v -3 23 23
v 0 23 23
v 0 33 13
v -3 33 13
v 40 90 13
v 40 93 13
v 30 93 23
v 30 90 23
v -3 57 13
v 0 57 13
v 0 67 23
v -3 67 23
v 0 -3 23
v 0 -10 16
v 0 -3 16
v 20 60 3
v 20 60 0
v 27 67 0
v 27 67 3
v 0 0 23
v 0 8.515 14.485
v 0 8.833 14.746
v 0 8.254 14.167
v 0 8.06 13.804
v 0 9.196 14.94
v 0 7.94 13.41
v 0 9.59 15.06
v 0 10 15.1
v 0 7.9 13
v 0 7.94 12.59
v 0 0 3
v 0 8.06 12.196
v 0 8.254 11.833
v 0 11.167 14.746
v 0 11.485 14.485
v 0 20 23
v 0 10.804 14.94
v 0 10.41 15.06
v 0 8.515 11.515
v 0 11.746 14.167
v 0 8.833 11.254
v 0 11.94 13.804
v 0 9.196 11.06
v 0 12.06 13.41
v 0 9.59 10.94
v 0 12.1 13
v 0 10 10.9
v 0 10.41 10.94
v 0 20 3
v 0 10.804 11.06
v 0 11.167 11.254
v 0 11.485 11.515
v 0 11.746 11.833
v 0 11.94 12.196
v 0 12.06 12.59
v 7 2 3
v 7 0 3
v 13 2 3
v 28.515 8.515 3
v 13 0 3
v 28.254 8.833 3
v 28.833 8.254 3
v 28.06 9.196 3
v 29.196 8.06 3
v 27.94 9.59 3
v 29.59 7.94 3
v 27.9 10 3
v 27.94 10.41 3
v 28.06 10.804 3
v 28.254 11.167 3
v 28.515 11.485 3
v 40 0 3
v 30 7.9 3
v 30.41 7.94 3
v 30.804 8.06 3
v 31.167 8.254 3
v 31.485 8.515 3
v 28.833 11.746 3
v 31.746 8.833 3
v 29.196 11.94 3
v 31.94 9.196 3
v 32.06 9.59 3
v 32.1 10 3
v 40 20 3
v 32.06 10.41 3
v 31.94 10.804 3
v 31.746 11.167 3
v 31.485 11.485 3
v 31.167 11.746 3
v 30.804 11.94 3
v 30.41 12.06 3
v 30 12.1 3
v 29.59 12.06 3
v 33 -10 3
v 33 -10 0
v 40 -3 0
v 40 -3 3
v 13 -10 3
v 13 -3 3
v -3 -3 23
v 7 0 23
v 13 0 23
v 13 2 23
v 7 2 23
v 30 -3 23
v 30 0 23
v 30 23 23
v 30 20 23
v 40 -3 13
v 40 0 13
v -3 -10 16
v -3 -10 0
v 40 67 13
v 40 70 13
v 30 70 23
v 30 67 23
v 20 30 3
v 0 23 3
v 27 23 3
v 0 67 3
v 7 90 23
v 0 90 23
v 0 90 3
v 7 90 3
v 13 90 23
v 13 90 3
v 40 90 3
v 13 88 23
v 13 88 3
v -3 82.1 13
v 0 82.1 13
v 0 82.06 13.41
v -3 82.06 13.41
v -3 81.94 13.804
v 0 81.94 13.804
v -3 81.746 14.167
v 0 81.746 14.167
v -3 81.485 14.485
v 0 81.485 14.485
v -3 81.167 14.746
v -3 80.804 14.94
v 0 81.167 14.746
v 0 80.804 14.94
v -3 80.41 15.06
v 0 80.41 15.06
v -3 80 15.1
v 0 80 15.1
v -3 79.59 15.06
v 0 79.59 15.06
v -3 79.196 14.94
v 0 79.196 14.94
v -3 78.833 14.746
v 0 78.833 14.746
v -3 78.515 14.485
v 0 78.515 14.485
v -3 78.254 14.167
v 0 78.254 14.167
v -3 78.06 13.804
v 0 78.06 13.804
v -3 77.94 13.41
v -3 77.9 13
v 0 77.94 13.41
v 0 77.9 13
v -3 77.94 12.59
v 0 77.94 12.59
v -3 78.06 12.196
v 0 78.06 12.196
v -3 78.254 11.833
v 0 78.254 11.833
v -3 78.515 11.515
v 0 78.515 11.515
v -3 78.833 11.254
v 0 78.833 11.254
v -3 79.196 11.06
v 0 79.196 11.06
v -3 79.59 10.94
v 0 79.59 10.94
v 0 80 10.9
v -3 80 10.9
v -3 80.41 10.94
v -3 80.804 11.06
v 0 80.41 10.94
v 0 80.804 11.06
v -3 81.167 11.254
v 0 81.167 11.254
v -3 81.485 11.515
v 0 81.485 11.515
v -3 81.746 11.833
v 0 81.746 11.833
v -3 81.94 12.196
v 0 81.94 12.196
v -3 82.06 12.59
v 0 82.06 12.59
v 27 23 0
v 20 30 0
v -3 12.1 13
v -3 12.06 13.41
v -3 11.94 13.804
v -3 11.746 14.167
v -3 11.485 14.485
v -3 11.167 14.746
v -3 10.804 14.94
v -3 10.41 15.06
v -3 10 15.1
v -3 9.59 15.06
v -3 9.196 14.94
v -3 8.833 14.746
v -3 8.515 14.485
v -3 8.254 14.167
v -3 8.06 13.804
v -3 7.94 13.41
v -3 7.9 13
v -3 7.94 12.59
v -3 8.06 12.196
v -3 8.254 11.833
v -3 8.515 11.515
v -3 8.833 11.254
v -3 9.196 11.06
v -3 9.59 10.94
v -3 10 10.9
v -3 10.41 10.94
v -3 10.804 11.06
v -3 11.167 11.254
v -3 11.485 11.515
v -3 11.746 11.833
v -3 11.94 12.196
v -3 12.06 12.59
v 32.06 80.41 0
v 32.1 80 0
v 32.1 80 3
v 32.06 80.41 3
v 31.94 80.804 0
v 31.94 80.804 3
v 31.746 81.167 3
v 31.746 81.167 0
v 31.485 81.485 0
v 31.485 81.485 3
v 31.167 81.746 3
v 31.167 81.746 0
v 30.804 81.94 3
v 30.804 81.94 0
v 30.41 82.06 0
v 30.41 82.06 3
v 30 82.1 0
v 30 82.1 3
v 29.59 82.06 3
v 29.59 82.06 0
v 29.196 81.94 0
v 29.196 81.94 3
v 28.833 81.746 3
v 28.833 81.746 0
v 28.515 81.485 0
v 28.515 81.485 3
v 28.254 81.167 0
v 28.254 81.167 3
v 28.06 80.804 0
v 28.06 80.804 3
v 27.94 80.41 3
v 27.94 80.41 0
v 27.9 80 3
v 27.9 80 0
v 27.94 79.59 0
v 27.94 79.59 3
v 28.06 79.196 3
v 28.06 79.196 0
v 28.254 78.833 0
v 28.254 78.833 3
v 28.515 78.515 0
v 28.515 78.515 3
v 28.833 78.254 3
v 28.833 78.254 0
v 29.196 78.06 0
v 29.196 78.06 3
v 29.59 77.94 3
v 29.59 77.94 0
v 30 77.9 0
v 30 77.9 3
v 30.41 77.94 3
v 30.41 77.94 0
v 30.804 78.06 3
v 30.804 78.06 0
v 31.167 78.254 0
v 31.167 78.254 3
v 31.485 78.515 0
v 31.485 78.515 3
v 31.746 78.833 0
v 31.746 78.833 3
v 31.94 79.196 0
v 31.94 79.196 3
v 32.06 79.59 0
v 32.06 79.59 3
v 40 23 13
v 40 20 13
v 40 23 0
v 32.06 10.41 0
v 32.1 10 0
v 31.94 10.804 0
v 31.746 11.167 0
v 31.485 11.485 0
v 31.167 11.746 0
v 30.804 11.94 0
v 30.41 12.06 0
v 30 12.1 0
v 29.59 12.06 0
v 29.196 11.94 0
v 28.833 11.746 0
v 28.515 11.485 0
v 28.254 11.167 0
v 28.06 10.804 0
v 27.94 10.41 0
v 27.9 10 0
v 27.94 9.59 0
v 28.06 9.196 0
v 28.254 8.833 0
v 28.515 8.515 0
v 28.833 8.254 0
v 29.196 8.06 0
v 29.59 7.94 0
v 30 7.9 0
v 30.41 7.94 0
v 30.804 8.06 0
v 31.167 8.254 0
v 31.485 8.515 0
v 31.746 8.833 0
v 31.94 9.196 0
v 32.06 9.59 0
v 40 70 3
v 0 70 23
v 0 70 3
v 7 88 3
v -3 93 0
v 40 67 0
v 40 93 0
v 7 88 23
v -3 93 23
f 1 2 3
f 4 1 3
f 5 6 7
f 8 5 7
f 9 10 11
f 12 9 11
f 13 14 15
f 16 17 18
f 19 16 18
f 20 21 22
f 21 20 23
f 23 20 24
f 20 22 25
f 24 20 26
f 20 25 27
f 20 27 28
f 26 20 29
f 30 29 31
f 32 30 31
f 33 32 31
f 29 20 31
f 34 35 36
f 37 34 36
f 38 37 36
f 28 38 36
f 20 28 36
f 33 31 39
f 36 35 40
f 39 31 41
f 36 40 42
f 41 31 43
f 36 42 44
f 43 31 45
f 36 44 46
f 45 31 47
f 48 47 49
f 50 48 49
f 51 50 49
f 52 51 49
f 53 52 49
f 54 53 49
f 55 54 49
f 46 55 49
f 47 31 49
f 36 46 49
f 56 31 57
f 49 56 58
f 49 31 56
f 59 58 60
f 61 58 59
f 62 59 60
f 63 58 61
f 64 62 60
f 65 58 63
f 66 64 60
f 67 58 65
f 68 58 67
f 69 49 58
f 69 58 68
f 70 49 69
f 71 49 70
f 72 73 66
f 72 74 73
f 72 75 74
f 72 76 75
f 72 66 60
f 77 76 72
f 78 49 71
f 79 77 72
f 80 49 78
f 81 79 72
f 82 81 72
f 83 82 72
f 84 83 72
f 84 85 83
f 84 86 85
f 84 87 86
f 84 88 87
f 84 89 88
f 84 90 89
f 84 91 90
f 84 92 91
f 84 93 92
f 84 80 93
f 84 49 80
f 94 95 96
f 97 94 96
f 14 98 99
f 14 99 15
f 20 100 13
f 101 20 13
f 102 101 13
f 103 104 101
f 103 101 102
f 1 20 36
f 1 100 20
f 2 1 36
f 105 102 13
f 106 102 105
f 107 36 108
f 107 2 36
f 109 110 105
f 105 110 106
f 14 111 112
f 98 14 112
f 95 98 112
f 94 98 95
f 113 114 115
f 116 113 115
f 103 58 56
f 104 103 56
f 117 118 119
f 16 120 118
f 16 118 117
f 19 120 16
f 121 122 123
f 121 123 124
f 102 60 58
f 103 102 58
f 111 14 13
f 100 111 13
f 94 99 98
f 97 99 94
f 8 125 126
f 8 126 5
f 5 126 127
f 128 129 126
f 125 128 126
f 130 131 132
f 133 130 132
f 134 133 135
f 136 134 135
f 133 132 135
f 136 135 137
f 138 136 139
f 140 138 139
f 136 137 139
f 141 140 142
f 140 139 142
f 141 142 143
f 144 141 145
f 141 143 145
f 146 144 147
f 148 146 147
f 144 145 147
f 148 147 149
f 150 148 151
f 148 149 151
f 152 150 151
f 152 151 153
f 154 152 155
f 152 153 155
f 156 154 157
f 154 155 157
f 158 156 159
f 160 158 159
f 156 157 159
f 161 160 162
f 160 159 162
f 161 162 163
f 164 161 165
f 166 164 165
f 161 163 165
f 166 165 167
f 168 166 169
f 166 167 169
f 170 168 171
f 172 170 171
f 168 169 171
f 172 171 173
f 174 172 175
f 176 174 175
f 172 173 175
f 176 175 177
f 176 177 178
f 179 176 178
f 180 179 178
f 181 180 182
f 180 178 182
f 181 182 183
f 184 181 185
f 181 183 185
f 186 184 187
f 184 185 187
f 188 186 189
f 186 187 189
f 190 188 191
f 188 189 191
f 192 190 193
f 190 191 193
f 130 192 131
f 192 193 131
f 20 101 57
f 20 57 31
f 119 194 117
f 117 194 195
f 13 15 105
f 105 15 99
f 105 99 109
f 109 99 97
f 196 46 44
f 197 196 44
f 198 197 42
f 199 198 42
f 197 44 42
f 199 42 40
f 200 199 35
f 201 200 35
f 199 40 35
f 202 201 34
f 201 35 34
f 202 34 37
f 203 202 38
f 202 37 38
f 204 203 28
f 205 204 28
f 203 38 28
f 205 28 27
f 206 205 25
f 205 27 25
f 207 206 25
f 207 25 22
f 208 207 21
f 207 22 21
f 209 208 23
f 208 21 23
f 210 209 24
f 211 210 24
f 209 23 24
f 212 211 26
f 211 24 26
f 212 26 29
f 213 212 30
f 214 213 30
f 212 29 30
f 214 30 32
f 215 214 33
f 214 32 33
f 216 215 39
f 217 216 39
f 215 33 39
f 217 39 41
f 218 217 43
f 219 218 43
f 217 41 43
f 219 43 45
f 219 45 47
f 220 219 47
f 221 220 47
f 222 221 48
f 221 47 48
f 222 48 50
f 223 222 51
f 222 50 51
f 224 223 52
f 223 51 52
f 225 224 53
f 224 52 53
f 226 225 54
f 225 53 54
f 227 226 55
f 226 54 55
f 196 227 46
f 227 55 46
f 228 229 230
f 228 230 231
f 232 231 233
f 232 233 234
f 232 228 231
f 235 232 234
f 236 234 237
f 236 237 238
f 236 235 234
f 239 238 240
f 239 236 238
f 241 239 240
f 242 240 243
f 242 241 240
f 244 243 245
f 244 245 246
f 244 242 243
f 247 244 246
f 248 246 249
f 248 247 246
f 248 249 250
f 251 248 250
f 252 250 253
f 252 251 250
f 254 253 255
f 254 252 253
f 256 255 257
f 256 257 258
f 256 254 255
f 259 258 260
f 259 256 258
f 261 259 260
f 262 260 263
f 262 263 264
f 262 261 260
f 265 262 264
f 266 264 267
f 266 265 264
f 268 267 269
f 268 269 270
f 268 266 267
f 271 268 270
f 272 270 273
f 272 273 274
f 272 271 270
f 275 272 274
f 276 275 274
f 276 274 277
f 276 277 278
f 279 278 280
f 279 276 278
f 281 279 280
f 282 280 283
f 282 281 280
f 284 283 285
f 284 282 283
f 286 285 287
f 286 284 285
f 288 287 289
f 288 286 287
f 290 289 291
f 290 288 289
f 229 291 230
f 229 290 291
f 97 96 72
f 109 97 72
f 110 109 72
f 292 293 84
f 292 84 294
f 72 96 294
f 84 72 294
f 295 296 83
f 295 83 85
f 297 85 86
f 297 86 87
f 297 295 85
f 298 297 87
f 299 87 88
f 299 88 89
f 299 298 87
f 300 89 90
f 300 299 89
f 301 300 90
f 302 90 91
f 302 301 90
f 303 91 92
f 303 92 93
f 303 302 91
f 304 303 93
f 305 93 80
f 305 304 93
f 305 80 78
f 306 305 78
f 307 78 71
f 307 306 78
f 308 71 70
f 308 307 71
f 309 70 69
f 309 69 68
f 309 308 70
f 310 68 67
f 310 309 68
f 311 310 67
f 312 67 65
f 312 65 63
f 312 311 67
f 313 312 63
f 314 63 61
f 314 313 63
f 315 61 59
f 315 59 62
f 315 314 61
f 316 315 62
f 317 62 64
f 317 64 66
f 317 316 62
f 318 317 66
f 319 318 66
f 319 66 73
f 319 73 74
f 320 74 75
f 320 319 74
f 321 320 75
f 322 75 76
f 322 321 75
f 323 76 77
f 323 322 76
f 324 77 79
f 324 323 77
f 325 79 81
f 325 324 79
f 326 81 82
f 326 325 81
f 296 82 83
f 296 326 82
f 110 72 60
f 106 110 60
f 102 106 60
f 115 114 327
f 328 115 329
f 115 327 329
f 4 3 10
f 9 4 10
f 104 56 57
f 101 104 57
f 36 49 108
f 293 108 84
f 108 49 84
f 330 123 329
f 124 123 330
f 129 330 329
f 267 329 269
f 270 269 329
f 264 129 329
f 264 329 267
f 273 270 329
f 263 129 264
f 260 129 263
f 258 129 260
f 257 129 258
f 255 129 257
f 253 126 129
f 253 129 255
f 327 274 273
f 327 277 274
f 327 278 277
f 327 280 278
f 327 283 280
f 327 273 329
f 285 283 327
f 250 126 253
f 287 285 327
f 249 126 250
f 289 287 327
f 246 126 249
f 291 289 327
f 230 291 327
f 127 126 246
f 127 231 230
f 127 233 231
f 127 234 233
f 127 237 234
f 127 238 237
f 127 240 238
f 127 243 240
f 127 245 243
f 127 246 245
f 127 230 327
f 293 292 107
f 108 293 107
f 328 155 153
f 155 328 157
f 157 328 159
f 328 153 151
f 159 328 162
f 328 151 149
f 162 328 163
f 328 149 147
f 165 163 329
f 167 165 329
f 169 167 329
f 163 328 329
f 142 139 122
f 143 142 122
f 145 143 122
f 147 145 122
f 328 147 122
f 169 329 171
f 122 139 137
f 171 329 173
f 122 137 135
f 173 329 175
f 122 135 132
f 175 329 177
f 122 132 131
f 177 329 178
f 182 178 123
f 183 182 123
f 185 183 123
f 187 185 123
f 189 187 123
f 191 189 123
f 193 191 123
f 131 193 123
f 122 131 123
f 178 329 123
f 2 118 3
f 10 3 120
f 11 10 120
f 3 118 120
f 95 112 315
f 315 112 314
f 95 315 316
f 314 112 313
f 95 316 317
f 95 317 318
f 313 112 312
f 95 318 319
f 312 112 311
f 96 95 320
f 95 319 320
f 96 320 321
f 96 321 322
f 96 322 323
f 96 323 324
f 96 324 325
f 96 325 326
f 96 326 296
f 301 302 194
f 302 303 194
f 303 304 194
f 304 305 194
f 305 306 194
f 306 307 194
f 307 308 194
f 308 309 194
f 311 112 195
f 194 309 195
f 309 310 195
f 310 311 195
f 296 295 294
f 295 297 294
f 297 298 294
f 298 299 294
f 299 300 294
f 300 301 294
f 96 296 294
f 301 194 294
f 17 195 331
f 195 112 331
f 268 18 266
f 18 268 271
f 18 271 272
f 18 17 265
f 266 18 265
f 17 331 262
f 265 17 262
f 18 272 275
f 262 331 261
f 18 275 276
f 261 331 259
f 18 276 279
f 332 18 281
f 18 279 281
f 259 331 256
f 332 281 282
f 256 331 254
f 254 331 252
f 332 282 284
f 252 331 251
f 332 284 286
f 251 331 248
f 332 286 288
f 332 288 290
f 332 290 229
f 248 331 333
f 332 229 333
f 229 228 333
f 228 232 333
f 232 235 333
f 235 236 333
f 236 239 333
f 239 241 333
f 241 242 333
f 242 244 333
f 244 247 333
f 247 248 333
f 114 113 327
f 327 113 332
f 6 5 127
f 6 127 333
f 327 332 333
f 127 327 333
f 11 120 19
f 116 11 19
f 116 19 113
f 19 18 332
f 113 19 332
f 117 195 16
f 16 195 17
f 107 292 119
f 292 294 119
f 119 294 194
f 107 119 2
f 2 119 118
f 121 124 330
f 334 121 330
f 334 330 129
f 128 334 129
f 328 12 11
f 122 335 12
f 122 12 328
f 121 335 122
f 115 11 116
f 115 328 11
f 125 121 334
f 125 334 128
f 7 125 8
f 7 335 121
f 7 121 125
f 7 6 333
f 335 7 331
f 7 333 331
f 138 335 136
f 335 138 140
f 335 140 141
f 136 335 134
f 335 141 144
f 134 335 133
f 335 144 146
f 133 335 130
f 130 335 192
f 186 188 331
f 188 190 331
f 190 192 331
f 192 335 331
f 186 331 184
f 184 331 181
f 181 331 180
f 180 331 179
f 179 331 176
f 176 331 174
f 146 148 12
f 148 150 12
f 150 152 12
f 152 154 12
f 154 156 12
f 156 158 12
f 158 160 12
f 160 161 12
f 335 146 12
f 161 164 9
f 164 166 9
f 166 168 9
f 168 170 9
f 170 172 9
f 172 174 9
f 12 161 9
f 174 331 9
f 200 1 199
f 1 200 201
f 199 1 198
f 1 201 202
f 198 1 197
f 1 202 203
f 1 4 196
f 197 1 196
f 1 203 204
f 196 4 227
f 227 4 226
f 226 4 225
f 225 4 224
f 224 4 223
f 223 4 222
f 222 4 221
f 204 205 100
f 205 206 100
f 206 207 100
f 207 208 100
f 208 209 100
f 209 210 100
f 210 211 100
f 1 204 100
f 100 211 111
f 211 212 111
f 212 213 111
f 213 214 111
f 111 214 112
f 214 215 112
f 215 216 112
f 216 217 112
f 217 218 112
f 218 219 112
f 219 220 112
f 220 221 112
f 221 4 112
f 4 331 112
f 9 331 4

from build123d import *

# Parameters (mm, degrees)
F0_R     = 2.1
F1_DEPTH = 3
F3_DEPTH = 20
F4_R     = 2.1
F5_DEPTH = 3
F7_DEPTH = 7
F9_DEPTH = 103.001


with BuildPart() as f1:
    # F0 (on Top) → F1 (new body)
    with BuildSketch(Plane.XY):
        Polygon((40, 67), (40, 93), (-3, 93), (-3, -10), (33, -10), (40, -3), (40, 23), (27, 23), (20, 30), (20, 60), (27, 67), align=None)
        with Locations((30, 10)):
            Circle(F0_R, mode=Mode.SUBTRACT)
        with Locations((30, 80)):
            Circle(F0_R, mode=Mode.SUBTRACT)
    extrude(amount=F1_DEPTH)

    # F2 (on face) → F3 (join)
    with BuildSketch(Plane.XY.offset(3)):
        Polygon((40, 90), (40, 93), (-3, 93), (-3, -10), (0, -10), (0, -3), (40, -3), (40, 0), (13, 0), (13, 2), (7, 2), (7, 0), (0, 0), (0, 20), (40, 20), (40, 23), (0, 23), (0, 67), (40, 67), (40, 70), (0, 70), (0, 90), (7, 90), (7, 88), (13, 88), (13, 90), align=None)
    extrude(amount=F3_DEPTH)

    # F4 (on face) → F5 (cut, through all)
    with BuildSketch(Plane.YZ):
        with Locations((10, 13)):
            Circle(F4_R)
        Polygon((67, 23), (23, 23), (33, 13), (57, 13), align=None)
        with Locations((80, 13)):
            Circle(F4_R)
        Polygon((-10, 16), (-3, 23), (-10, 23), align=None)
    extrude(amount=-F5_DEPTH, mode=Mode.SUBTRACT)

    # F6 (on face) → F7 (join, through all)
    with BuildSketch(Plane.XZ.offset(10)):
        Polygon((0, 16), (0, 3), (13, 3), align=None)
    extrude(amount=-F7_DEPTH)

    # F8 (on face) → F9 (cut, through all)
    with BuildSketch(Plane(origin=(0, 93, 0), x_dir=(-1, 0, 0), z_dir=(0, 1, 0))):
        Polygon((-30, 23), (-40, 23), (-40, 13), align=None)
    extrude(amount=-F9_DEPTH, mode=Mode.SUBTRACT)


solid = f1.part
